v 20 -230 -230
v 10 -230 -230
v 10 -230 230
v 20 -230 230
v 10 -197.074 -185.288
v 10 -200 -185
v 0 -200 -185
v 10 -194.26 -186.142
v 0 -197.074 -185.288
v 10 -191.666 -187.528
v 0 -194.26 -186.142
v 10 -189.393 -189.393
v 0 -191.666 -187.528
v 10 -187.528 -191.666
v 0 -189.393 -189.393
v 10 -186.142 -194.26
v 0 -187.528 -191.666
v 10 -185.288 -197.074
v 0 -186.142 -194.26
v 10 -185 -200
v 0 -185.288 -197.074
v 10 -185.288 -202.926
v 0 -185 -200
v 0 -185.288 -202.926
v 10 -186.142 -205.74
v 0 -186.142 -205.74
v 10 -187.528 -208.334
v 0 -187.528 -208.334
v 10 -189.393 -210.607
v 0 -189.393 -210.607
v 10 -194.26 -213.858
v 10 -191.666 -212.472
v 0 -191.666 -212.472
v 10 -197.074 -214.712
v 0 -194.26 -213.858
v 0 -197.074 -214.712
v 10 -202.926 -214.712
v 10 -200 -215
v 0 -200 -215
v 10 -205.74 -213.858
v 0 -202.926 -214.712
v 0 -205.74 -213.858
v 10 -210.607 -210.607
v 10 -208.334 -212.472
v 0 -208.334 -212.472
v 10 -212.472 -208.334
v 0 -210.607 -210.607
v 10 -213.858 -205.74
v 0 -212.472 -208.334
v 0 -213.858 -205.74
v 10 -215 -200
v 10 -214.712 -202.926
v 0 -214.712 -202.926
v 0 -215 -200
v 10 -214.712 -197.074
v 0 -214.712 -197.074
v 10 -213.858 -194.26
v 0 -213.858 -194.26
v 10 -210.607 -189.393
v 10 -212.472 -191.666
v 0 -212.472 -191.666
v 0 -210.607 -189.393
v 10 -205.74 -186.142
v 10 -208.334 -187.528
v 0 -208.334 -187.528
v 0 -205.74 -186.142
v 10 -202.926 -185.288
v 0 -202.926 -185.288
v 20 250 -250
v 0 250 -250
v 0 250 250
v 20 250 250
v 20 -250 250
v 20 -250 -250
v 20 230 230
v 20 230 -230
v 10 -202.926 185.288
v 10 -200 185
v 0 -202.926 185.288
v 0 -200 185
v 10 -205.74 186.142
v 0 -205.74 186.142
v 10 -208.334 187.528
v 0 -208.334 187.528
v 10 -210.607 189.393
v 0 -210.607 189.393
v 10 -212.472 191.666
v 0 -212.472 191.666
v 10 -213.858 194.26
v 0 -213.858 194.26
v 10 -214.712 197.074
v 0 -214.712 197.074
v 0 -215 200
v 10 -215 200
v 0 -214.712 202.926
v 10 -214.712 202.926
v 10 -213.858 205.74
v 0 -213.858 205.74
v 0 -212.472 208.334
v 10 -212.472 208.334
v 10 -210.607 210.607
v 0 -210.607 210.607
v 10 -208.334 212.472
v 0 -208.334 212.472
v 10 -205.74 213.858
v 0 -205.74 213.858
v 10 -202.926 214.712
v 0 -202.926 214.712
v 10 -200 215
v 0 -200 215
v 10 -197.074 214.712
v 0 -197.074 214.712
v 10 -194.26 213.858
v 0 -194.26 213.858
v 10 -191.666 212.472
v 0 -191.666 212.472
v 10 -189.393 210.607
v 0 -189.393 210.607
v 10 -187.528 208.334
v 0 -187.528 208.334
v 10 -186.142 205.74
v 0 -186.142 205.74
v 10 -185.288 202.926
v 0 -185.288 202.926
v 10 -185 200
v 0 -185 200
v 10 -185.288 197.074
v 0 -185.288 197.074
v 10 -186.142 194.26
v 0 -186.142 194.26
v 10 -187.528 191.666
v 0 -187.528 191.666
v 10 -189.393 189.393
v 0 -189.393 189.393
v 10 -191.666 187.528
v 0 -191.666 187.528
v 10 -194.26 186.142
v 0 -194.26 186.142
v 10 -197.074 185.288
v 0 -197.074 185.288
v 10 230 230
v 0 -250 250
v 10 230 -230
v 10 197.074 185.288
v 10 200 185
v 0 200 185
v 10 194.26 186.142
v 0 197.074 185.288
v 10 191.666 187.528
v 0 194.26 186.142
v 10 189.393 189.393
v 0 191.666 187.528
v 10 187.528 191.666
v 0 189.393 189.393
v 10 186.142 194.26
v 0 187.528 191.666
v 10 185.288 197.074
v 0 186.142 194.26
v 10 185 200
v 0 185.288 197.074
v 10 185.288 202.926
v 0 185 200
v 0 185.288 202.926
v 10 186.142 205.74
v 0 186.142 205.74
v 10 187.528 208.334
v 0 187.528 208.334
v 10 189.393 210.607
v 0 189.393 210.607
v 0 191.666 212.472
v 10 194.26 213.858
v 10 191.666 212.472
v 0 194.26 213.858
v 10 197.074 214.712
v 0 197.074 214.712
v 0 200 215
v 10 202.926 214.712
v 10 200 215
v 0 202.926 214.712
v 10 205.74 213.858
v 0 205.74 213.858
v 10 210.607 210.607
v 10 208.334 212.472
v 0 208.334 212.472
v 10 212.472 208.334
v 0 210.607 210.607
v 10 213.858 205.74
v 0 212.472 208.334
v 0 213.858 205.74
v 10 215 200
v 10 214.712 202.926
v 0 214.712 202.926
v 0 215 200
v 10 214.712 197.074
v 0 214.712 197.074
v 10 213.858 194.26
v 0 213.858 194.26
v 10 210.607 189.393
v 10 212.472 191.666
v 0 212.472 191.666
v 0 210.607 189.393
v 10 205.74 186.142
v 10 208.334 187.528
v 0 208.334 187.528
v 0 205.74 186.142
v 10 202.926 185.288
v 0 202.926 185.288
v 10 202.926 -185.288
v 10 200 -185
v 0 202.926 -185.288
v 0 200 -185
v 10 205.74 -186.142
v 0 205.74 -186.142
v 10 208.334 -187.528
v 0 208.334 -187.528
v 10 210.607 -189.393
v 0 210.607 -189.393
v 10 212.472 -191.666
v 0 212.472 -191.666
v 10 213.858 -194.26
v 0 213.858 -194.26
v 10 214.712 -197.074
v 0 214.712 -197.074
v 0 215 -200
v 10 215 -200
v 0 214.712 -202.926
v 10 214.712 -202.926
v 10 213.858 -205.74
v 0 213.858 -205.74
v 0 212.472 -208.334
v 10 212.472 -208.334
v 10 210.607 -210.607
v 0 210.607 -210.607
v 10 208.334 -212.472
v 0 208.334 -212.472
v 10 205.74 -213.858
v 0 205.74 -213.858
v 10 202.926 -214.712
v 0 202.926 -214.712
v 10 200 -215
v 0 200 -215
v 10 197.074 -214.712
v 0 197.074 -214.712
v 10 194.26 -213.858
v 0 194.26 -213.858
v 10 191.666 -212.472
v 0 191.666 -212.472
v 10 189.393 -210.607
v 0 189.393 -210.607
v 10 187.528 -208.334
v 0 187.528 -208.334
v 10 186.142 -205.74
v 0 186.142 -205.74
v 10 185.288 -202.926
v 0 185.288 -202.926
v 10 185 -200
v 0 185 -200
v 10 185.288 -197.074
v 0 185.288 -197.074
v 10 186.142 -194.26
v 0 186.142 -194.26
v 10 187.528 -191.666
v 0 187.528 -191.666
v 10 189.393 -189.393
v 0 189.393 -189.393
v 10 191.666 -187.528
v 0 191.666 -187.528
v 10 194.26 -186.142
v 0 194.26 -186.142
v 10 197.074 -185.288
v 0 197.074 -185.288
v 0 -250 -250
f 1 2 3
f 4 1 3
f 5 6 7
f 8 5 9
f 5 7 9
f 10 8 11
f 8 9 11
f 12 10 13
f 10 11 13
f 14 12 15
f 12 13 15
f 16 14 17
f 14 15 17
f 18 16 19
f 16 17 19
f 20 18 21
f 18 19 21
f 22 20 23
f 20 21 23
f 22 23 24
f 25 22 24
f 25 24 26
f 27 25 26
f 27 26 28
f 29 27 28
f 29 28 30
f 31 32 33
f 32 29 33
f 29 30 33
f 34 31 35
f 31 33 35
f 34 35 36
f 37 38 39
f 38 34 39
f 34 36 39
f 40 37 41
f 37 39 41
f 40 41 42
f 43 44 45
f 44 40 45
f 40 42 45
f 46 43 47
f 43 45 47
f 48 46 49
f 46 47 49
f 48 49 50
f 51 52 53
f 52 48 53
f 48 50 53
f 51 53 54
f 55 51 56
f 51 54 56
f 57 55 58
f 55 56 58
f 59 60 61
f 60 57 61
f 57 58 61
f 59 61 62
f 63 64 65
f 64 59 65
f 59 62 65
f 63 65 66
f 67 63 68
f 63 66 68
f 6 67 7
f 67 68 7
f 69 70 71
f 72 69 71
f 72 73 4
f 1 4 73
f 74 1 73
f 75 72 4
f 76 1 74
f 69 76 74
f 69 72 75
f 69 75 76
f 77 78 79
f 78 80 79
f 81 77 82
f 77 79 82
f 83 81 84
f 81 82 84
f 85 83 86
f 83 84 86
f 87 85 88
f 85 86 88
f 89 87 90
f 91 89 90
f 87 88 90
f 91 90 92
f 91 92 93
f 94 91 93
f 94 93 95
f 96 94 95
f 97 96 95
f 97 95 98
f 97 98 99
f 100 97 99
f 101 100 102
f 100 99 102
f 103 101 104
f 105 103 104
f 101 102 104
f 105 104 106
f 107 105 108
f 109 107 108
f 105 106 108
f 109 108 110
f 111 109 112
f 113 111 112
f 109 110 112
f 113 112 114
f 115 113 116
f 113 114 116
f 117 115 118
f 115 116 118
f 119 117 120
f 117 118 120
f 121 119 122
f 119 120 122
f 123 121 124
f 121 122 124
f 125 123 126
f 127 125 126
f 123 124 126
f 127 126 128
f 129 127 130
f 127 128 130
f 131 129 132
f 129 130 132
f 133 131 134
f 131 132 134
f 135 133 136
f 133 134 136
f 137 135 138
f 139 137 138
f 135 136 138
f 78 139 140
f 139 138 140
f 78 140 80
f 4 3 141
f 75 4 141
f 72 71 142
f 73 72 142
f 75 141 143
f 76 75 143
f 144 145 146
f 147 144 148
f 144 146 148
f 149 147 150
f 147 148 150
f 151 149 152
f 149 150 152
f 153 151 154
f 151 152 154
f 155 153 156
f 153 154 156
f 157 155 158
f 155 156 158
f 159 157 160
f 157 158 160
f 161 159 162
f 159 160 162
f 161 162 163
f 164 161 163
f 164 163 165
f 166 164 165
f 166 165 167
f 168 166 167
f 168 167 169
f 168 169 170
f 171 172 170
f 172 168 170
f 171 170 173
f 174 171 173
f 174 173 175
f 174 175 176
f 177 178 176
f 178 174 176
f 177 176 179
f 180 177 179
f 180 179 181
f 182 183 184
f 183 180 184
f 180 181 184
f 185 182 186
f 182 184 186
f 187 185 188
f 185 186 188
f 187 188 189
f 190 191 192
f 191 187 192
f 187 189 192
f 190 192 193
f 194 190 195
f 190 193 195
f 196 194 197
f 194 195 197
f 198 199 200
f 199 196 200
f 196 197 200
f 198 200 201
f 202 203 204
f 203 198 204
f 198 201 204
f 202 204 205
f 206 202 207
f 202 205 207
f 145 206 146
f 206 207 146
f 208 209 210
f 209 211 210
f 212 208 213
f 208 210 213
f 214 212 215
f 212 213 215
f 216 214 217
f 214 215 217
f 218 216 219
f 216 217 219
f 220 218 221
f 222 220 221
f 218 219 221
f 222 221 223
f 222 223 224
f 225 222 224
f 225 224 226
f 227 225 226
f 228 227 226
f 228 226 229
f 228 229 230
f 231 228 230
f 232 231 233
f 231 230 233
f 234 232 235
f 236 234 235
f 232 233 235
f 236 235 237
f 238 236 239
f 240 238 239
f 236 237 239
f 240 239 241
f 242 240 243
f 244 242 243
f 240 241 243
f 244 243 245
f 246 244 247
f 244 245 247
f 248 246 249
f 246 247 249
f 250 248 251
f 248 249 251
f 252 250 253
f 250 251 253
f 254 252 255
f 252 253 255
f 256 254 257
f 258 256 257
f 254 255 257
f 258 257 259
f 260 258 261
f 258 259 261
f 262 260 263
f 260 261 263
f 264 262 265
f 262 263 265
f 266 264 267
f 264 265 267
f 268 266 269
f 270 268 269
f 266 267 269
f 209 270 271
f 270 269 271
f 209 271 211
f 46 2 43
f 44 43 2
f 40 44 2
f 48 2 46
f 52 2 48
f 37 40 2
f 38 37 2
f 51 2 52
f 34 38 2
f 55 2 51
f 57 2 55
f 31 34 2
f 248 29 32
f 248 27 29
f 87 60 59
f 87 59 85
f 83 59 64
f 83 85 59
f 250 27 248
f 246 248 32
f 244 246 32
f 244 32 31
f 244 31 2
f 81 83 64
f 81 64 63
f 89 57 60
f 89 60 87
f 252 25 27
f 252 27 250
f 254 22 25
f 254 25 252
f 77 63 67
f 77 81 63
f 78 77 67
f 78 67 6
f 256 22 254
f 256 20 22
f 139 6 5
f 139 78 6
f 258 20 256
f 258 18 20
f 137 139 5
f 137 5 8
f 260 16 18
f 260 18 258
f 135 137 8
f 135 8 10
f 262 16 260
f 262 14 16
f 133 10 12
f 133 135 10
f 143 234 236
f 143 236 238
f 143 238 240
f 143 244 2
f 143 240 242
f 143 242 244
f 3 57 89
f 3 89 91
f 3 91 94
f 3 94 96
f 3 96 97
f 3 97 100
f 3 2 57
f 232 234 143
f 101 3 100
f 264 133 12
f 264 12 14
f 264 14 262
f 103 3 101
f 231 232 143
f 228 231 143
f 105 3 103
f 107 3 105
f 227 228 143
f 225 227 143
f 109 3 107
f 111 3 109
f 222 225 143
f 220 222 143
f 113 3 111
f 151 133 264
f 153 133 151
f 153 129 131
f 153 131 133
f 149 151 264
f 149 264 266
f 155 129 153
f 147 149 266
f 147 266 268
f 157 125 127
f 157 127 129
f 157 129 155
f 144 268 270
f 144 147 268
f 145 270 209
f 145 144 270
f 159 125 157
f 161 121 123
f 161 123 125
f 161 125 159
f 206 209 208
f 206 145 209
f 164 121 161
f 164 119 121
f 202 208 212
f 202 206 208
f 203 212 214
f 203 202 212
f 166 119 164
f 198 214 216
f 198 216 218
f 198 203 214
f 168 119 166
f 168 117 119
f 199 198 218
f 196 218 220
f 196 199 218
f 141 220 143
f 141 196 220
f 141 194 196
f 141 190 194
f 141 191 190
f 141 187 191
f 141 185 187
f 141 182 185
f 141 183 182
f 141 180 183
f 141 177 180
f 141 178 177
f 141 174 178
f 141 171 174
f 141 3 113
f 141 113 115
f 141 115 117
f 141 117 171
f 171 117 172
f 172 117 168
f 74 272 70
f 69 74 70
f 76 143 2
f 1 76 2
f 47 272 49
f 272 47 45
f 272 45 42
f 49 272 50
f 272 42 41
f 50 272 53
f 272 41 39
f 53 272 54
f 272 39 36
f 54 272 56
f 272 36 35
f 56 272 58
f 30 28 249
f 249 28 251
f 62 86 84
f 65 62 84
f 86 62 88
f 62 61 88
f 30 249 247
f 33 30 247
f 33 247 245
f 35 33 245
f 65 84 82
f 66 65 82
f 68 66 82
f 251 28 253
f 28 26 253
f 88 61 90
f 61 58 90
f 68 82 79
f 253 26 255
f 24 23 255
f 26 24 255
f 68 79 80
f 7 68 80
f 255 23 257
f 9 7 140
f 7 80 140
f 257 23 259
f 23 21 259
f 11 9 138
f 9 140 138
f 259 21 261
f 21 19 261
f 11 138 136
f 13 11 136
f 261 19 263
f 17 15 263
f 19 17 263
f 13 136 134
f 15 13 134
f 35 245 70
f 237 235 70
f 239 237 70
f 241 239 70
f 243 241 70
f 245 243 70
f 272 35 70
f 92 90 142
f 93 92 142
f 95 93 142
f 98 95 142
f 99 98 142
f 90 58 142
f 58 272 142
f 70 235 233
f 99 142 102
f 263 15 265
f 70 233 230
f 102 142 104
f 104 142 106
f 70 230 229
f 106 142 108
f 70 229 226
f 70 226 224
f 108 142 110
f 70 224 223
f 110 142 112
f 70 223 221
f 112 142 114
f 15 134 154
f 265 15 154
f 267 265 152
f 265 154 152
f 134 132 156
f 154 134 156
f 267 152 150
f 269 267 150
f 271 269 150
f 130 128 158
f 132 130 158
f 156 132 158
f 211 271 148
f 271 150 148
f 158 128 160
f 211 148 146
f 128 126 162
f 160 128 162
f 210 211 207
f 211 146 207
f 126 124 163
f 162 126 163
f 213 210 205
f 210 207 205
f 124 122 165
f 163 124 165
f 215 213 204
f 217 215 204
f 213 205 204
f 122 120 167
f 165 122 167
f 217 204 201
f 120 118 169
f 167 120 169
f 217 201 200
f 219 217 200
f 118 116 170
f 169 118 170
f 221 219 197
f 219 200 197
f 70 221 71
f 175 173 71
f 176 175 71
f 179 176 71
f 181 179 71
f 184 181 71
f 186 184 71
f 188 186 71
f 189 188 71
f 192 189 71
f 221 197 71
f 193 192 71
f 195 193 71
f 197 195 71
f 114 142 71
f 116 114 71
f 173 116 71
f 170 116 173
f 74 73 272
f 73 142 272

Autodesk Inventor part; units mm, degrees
ref_plane "YZ Plane" through (0, 0, 0) normal (1, 0, 0) x (0, 1, 0)
ref_plane "XZ Plane" through (0, 0, 0) normal (0, 1, 0) x (-1, 0, 0)
ref_plane "XY Plane" through (0, 0, 0) normal (0, 0, 1) x (1, 0, 0)
sketch "Sketch1" plane through (0, 0, 0) normal (1, 0, 0) x (0, 1, 0)
  line L0 (250, 250) -> (-250, 250)
  line L1 (-250, 250) -> (-250, -250)
  line L2 (-250, -250) -> (250, -250)
  line L3 (250, -250) -> (250, 250)
  line L4 (250, 250) -> (-250, -250) construction
  line L5 (-250, 250) -> (250, -250) construction
  point P0 (0, 0)
  dimension "d0" = 500
  dimension "d1" = 500
extrude "Extrusion1" add sketch "Sketch1" along normal blind 10
sketch "Sketch2" plane through (10, 0, 0) normal (1, 0, 0) x (0, 0, -1)
  line L0 (-250, 250) -> (-250, -250) projected
  line L1 (-250, -250) -> (250, -250) projected
  line L2 (250, -250) -> (250, 250) projected
  line L3 (250, 250) -> (-250, 250) projected
  line L4 (-230, 230) -> (230, 230)
  line L5 (230, 230) -> (230, -230)
  line L6 (230, -230) -> (-230, -230)
  line L7 (-230, -230) -> (-230, 230)
  line L8 (-230, 230) -> (230, -230) construction
  line L9 (230, 230) -> (-230, -230) construction
  point P0 (0, 0)
  dimension "d4" = 20
  dimension "d5" = 20
extrude "Extrusion2" add sketch "Sketch2" along normal blind 10
sketch "Sketch3" plane through (10, 0, 0) normal (1, 0, 0) x (0, 0, -1)
  circle A0 centre (-200, -200) radius 30
  line L0 (-250, 250) -> (-250, -250) projected
  line L1 (-250, -250) -> (250, -250) projected
  point P0 (0, 0)
  dimension "d8" = 60
  dimension "d9" = 50
  dimension "d10" = 50
hole "Hole1" at (10, -200, 200) direction (-1, 0, 0) diameter 30 depth 67.75
mirror "Mirror1" about plane through (0, 0, 0) normal (0, 1, 0) of "Hole1"
mirror "Mirror2" about plane through (0, 0, 0) normal (0, 0, 1) of "Hole1", "Mirror1"
sketch "Sketch4" plane through (10, 0, 0) normal (1, 0, 0) x (0, 0, -1)
  line L0 (-250, 250) -> (254.1843, 248.5364) construction
  line L1 (254.1843, 248.5364) -> (252.7352, -250.6505) construction
  line L2 (252.7352, -250.6505) -> (-251.4491, -249.1869) construction
  line L3 (-251.4491, -249.1869) -> (-250, 250) construction
  point P0 (0, 0)
properties part number "S.Carrom board" material "Birch"
